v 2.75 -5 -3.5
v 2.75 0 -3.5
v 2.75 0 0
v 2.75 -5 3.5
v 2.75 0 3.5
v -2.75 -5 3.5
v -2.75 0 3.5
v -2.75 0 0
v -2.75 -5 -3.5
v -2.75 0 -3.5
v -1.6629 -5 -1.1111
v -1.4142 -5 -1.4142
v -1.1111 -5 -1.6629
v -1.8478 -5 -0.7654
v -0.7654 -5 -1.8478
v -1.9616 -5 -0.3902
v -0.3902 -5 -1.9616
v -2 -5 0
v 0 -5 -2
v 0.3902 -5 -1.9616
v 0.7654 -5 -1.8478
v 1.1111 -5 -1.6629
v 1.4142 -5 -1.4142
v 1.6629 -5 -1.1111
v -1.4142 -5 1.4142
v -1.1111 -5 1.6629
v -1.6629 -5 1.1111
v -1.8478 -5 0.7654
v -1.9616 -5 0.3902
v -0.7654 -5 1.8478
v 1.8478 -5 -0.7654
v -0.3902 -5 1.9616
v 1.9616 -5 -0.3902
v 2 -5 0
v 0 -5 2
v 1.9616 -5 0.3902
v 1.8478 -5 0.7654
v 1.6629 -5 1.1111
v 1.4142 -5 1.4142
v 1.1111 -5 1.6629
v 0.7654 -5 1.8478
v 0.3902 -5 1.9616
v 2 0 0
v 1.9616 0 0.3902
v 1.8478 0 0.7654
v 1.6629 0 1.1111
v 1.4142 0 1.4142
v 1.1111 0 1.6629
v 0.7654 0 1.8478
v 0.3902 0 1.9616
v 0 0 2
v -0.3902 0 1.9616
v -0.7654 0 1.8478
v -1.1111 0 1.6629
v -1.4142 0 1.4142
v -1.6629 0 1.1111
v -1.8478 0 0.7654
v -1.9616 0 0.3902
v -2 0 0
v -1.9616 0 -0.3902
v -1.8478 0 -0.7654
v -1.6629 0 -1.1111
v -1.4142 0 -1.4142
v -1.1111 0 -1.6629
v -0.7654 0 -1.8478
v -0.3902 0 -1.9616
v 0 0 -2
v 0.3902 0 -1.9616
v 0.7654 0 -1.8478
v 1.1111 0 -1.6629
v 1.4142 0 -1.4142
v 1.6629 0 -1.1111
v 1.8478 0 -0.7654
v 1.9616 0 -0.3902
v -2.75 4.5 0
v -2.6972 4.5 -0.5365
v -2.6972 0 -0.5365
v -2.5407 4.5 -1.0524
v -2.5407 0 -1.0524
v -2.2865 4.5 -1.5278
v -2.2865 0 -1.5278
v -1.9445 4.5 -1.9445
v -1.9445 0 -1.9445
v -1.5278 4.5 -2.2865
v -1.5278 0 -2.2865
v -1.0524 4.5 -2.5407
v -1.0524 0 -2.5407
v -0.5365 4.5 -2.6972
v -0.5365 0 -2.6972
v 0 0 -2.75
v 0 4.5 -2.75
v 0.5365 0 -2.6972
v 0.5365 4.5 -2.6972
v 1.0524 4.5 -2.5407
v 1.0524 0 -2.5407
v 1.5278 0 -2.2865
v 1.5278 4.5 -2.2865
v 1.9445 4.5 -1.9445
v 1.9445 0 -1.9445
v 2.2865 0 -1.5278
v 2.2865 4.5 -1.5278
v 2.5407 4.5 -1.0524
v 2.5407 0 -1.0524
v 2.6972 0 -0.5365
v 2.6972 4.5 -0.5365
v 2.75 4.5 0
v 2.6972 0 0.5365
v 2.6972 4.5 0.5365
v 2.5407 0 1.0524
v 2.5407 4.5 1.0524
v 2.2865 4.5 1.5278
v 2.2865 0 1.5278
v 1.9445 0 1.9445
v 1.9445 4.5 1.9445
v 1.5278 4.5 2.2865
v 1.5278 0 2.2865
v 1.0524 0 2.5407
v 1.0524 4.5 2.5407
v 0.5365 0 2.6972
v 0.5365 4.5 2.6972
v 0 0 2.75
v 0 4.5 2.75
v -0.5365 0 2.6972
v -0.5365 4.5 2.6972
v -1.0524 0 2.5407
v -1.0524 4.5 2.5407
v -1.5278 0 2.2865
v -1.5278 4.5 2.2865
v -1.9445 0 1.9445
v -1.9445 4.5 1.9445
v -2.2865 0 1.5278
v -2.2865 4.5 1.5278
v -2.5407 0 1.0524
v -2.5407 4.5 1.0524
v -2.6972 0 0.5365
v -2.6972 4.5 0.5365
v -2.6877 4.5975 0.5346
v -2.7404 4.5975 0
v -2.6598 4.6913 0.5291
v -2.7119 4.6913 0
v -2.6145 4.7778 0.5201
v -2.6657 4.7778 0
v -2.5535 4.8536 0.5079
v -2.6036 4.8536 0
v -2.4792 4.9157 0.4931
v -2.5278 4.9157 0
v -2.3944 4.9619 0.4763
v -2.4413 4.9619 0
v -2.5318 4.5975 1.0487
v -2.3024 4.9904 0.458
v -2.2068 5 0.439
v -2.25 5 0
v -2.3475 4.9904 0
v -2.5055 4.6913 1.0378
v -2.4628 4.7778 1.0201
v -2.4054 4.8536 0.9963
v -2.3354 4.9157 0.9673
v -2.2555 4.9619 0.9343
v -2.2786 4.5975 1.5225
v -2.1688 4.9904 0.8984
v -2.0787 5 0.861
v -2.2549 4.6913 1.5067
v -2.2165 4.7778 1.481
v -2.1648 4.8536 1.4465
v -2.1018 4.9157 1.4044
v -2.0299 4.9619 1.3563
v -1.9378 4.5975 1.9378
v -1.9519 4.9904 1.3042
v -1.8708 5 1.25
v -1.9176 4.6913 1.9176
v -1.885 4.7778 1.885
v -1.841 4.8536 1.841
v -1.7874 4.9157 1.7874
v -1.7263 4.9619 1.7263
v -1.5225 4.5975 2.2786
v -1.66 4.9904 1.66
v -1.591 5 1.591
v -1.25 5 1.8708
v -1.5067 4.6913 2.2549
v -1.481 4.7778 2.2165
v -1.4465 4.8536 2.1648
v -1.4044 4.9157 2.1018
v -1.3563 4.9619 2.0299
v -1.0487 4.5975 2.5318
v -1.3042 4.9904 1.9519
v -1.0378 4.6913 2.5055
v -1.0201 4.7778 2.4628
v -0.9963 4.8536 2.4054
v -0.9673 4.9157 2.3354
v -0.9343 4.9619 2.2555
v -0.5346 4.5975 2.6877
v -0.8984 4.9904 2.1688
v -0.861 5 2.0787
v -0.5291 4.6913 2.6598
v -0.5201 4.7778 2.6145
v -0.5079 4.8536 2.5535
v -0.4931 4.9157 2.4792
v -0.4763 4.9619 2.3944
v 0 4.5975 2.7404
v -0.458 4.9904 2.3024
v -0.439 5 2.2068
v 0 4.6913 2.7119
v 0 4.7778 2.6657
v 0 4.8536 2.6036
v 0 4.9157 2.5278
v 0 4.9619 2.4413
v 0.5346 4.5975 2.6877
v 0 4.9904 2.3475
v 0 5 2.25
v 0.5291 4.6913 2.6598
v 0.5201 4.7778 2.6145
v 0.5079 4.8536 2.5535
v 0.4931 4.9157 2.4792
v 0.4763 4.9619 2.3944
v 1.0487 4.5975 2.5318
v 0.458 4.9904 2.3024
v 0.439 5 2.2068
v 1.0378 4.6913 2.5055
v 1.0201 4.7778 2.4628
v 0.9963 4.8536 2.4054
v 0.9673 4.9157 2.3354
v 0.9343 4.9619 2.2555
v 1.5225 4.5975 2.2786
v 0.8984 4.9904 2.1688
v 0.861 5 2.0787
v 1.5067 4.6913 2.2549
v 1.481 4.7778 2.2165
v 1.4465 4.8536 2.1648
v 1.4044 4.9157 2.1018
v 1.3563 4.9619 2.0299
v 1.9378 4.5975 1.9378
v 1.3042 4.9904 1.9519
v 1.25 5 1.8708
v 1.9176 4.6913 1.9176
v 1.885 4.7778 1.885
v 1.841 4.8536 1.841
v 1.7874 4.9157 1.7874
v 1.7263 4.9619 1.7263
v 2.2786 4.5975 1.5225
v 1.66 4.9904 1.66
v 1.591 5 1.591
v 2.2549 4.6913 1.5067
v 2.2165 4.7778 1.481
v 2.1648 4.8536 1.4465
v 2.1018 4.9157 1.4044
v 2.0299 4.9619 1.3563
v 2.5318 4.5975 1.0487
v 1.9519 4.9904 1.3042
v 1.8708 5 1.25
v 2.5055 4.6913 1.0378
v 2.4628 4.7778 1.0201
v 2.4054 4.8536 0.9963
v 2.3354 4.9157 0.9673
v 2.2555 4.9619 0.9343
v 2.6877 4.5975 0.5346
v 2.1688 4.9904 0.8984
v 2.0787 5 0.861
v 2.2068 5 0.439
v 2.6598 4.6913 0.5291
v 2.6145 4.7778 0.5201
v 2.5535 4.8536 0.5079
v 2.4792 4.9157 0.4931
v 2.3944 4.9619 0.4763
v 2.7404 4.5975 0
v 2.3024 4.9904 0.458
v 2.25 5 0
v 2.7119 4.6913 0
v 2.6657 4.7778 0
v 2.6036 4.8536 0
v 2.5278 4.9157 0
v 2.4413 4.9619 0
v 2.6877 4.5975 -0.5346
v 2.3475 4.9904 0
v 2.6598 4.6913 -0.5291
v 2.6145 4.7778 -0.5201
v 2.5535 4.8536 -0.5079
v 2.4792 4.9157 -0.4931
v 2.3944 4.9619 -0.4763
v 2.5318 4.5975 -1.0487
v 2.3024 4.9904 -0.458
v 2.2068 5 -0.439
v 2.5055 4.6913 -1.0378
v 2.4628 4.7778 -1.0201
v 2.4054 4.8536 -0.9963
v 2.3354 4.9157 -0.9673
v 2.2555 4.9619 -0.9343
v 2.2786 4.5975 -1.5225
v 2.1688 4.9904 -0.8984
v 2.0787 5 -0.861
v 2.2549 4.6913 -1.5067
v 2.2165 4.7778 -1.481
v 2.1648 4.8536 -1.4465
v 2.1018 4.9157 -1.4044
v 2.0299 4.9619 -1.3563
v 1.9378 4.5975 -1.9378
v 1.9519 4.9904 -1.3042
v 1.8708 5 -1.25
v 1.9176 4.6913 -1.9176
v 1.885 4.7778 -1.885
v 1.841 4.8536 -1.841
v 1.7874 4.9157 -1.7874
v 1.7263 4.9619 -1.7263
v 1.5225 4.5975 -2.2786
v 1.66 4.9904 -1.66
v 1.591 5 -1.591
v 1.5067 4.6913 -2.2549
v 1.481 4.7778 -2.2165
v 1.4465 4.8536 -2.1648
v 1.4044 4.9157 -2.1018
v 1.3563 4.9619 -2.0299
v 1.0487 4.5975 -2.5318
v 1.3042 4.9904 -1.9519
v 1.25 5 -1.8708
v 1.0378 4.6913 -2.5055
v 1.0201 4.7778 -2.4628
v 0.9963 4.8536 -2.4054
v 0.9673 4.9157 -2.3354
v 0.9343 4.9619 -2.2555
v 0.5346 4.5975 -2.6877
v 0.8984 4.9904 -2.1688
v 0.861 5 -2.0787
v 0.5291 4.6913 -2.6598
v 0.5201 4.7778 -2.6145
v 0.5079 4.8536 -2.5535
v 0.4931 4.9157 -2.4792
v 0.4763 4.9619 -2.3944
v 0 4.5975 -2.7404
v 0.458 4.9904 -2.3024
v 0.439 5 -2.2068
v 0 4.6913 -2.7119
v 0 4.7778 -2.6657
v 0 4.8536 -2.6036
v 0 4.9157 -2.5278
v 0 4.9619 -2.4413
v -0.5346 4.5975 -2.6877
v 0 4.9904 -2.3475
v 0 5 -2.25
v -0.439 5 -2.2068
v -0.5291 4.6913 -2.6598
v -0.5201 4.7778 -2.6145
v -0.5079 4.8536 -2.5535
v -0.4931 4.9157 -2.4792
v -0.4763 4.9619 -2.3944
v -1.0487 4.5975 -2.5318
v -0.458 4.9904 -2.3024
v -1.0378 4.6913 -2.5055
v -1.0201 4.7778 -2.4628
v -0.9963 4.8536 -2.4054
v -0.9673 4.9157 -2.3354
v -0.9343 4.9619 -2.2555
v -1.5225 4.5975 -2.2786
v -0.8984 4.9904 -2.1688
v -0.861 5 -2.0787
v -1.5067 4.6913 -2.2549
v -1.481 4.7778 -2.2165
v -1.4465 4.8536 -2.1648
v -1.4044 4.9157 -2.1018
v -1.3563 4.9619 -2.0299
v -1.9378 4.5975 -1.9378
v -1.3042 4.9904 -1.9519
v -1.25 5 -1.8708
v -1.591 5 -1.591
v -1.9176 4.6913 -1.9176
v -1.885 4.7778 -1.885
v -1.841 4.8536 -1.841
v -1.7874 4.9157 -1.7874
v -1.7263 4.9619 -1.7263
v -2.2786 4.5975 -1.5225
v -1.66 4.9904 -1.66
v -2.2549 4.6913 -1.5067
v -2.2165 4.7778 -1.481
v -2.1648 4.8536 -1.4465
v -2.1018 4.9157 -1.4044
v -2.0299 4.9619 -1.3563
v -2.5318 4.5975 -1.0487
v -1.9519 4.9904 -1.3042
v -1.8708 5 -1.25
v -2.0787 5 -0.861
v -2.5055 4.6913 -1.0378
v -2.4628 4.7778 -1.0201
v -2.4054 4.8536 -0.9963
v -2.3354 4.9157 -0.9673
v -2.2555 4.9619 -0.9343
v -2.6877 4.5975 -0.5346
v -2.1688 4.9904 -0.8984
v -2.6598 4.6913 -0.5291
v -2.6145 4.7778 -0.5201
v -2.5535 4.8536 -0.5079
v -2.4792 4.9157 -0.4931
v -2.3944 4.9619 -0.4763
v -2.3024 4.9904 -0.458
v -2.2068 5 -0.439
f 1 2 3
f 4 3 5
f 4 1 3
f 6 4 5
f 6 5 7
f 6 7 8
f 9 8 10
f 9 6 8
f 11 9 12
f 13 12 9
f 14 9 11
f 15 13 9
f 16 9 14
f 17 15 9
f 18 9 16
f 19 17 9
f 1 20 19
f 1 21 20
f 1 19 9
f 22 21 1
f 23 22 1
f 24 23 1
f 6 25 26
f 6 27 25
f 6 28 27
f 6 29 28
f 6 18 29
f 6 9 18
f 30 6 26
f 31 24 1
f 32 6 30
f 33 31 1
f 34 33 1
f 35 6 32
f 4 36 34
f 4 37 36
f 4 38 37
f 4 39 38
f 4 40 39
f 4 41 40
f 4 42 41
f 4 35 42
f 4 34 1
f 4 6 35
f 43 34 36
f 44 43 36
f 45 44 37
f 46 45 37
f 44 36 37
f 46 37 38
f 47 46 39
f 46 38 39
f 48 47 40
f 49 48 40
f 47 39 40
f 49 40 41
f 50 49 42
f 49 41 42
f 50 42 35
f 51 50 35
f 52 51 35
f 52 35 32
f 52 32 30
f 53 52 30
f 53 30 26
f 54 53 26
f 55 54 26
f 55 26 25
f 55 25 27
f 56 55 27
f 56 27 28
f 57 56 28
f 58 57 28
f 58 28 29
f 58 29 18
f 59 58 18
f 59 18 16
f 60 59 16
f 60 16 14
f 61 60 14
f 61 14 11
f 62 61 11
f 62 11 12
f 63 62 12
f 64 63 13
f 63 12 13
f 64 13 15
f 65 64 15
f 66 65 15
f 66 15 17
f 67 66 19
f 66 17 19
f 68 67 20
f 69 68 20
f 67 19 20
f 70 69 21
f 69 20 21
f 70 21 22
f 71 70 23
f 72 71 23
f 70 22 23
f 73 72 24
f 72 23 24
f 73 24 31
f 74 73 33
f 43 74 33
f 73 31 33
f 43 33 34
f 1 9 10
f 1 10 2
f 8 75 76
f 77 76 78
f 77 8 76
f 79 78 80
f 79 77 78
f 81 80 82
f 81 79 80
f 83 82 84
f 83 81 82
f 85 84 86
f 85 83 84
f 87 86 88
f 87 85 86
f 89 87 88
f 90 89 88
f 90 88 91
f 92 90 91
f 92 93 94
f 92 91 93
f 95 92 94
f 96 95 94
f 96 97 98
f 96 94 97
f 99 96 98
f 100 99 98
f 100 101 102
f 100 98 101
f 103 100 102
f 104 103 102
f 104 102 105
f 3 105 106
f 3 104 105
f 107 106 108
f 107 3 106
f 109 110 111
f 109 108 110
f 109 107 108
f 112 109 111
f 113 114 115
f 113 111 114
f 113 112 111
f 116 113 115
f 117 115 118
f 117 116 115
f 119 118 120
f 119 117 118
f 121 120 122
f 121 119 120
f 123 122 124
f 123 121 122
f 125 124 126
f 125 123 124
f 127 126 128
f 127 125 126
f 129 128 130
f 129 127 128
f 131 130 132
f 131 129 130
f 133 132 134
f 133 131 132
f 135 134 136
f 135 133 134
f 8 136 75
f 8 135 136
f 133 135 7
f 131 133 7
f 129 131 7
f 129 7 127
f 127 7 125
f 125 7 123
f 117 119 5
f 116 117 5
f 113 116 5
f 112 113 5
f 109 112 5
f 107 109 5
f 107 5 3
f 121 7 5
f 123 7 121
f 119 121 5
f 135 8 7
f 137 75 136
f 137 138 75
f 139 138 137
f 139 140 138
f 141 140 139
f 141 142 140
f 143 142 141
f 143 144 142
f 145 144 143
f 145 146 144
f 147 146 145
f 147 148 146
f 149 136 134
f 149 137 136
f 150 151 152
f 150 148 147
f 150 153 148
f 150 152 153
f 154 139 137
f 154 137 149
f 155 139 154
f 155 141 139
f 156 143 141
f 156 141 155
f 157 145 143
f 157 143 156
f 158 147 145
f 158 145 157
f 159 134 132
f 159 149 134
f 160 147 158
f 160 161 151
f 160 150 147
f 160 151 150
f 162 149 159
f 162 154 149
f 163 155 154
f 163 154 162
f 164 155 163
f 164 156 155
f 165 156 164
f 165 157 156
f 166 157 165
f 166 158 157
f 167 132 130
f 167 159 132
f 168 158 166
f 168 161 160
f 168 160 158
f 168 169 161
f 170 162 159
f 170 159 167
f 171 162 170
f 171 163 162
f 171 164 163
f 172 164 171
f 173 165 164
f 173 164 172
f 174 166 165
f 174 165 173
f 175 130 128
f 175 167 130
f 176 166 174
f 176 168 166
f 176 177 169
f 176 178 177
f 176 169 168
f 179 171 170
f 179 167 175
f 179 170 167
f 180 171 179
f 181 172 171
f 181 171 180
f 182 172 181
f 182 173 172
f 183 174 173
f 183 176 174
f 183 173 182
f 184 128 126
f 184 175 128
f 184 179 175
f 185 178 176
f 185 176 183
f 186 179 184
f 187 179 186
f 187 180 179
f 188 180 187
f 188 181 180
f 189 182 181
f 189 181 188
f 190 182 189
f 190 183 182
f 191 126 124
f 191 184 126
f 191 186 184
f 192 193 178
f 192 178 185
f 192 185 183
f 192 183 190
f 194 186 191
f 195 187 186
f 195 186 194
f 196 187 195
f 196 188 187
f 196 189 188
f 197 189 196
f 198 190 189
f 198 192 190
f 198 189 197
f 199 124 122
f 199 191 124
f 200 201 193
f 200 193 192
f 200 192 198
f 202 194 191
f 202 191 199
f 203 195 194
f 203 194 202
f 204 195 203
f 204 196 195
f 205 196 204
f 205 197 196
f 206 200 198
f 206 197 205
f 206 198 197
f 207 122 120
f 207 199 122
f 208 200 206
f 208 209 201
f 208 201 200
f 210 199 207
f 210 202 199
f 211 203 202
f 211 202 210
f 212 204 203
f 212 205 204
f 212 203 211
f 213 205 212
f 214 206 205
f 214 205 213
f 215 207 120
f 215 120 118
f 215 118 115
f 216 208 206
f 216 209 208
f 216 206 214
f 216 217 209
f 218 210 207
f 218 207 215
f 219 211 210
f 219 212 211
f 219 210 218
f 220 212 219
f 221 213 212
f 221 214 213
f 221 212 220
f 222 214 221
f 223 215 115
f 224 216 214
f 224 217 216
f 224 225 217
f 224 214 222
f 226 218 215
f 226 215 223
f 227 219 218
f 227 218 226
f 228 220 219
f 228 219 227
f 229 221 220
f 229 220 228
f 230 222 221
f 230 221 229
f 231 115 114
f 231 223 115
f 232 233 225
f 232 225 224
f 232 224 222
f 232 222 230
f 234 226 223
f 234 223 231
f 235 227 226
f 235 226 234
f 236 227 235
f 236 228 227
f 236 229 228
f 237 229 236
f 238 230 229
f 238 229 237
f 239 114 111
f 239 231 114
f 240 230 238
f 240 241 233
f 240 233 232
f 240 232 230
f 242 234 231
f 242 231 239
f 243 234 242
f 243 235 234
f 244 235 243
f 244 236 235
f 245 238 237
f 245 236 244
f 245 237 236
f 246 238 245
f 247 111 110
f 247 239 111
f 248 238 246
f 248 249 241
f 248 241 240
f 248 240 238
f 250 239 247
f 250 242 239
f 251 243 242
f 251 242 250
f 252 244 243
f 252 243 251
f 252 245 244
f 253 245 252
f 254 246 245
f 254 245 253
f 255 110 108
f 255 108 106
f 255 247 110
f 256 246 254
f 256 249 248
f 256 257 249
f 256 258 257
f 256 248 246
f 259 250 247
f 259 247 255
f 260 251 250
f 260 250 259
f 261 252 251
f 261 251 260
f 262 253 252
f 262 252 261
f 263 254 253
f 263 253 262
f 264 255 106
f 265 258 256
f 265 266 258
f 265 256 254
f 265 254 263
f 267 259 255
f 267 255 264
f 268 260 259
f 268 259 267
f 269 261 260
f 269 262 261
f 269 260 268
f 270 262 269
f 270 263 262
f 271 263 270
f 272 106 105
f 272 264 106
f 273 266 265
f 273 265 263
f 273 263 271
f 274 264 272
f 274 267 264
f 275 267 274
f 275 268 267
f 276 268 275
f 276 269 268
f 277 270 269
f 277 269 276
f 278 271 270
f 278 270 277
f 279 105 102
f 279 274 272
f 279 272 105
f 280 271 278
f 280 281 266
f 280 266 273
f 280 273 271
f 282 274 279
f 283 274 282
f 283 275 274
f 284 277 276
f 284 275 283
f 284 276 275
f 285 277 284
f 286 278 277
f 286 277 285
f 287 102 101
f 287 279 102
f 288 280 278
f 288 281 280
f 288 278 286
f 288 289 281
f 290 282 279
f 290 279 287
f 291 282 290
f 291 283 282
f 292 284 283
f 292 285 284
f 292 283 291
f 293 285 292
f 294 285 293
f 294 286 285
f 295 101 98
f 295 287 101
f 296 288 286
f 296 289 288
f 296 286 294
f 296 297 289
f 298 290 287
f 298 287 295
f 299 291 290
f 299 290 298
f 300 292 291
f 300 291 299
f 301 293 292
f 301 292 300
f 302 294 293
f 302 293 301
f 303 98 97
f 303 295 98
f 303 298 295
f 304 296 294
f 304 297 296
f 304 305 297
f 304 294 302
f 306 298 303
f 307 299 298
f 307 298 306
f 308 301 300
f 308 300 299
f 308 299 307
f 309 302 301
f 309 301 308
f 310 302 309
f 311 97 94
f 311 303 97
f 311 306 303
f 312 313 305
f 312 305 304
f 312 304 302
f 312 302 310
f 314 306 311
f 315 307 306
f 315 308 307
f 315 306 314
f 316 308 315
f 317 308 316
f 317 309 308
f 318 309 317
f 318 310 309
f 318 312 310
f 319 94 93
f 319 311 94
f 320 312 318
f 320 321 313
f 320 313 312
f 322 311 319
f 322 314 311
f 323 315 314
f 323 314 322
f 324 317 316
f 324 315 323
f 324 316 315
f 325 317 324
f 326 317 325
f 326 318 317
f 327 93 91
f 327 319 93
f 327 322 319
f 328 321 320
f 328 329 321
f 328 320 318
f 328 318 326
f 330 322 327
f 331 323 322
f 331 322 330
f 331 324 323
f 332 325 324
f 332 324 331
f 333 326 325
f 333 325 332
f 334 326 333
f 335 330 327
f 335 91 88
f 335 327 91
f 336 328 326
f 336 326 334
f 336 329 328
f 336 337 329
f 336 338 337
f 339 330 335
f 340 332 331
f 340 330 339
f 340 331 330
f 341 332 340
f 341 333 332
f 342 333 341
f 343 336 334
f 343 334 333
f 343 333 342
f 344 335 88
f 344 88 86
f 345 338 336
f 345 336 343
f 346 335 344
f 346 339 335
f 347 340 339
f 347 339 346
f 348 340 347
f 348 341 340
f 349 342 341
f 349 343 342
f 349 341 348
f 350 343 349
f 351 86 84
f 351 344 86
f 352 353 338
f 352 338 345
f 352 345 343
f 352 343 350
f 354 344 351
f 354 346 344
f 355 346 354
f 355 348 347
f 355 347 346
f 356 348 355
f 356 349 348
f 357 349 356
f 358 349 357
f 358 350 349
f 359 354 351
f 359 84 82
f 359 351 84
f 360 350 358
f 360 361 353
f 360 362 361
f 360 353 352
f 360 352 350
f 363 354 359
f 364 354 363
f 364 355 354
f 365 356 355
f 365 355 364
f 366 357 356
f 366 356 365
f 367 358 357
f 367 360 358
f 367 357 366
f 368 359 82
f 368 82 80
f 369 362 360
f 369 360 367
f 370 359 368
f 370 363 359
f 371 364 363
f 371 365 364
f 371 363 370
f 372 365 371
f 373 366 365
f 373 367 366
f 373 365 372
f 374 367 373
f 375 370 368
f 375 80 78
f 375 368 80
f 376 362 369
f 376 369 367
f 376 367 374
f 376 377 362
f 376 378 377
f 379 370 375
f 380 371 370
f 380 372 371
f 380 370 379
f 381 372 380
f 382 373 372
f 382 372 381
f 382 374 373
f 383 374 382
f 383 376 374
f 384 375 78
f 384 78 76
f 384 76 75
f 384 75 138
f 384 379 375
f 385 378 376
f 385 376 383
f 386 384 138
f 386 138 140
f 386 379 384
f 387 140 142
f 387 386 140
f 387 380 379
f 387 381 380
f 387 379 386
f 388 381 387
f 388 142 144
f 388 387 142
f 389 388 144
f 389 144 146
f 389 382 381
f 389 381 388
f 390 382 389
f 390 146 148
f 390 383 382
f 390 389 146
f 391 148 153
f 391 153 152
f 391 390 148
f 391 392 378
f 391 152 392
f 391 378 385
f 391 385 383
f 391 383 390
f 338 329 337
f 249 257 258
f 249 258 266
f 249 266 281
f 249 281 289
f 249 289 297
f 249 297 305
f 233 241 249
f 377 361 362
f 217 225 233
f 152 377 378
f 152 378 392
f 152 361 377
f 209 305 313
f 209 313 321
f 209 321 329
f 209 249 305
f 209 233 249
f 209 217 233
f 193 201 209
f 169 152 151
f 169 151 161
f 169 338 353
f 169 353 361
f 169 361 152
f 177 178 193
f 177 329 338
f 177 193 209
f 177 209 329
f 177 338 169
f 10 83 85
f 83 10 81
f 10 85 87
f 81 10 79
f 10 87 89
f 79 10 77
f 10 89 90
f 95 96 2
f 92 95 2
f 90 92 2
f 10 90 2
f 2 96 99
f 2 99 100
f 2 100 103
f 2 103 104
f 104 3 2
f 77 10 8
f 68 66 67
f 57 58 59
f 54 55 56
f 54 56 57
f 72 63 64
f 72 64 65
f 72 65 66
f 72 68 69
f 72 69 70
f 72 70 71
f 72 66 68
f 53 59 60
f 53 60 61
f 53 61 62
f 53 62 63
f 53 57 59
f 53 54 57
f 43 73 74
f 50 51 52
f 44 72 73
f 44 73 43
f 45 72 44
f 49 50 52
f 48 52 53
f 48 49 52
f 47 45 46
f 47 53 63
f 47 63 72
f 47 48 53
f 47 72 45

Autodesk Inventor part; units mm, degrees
ref_plane "YZ Plane" through (0, 0, 0) normal (1, 0, 0) x (0, 1, 0)
ref_plane "XZ Plane" through (0, 0, 0) normal (0, 1, 0) x (-1, 0, 0)
ref_plane "XY Plane" through (0, 0, 0) normal (0, 0, 1) x (1, 0, 0)
sketch "Esquisse1" plane through (0, 0, 0) normal (0, 1, 0) x (-1, 0, 0)
  circle A0 centre (0, 0) radius 2.75
  dimension "d0" = 5.5
extrude "Extrusion1" add sketch "Esquisse1" along normal mid plane 10
sketch "Esquisse2" plane through (0, -5, 0) normal (0, -1, 0) x (1, 0, 0)
  circle A0 centre (0, 0) radius 2
  dimension "d3" = 4
extrude "Extrusion2" cut sketch "Esquisse2" against normal blind 5
fillet "Congé1" radius 0.5 1 edges at (2.75, 5, 0)
sketch "Esquisse3" plane through (0, -5, 0) normal (0, -1, 0) x (1, 0, 0)
  line L0 (9.7978, 4.7343) -> (6.189, 4.7343)
  line L1 (6.189, 4.7343) -> (6.189, -4.7343)
  line L2 (6.189, -4.7343) -> (9.7978, -4.7343)
  line L3 (9.7978, -4.7343) -> (9.7978, 4.7343)
  circle A0 centre (0, 0) radius 2.75 projected
  line L4 (2.75, 0) -> (-2.75, 0) construction
  line L5 (9.7978, 0) -> (6.189, 0) construction
  line L6 (2.75, 3.5) -> (-2.75, 3.5)
  line L7 (-2.75, 3.5) -> (-2.75, -3.5)
  line L8 (-2.75, -3.5) -> (2.75, -3.5)
  line L9 (2.75, -3.5) -> (2.75, 3.5)
  line L10 (2.75, 0) -> (-2.75, 0) construction
  dimension "d7" = 5.5
  dimension "d8" = 5.5
  dimension "d9" = 7
extrude "Extrusion3" add sketch "Esquisse3" against normal blind 5 contours L9 L8 L7 A0 | A0 L7 L6 L9
equation "\"d8\" = d7"
properties part number "button"
